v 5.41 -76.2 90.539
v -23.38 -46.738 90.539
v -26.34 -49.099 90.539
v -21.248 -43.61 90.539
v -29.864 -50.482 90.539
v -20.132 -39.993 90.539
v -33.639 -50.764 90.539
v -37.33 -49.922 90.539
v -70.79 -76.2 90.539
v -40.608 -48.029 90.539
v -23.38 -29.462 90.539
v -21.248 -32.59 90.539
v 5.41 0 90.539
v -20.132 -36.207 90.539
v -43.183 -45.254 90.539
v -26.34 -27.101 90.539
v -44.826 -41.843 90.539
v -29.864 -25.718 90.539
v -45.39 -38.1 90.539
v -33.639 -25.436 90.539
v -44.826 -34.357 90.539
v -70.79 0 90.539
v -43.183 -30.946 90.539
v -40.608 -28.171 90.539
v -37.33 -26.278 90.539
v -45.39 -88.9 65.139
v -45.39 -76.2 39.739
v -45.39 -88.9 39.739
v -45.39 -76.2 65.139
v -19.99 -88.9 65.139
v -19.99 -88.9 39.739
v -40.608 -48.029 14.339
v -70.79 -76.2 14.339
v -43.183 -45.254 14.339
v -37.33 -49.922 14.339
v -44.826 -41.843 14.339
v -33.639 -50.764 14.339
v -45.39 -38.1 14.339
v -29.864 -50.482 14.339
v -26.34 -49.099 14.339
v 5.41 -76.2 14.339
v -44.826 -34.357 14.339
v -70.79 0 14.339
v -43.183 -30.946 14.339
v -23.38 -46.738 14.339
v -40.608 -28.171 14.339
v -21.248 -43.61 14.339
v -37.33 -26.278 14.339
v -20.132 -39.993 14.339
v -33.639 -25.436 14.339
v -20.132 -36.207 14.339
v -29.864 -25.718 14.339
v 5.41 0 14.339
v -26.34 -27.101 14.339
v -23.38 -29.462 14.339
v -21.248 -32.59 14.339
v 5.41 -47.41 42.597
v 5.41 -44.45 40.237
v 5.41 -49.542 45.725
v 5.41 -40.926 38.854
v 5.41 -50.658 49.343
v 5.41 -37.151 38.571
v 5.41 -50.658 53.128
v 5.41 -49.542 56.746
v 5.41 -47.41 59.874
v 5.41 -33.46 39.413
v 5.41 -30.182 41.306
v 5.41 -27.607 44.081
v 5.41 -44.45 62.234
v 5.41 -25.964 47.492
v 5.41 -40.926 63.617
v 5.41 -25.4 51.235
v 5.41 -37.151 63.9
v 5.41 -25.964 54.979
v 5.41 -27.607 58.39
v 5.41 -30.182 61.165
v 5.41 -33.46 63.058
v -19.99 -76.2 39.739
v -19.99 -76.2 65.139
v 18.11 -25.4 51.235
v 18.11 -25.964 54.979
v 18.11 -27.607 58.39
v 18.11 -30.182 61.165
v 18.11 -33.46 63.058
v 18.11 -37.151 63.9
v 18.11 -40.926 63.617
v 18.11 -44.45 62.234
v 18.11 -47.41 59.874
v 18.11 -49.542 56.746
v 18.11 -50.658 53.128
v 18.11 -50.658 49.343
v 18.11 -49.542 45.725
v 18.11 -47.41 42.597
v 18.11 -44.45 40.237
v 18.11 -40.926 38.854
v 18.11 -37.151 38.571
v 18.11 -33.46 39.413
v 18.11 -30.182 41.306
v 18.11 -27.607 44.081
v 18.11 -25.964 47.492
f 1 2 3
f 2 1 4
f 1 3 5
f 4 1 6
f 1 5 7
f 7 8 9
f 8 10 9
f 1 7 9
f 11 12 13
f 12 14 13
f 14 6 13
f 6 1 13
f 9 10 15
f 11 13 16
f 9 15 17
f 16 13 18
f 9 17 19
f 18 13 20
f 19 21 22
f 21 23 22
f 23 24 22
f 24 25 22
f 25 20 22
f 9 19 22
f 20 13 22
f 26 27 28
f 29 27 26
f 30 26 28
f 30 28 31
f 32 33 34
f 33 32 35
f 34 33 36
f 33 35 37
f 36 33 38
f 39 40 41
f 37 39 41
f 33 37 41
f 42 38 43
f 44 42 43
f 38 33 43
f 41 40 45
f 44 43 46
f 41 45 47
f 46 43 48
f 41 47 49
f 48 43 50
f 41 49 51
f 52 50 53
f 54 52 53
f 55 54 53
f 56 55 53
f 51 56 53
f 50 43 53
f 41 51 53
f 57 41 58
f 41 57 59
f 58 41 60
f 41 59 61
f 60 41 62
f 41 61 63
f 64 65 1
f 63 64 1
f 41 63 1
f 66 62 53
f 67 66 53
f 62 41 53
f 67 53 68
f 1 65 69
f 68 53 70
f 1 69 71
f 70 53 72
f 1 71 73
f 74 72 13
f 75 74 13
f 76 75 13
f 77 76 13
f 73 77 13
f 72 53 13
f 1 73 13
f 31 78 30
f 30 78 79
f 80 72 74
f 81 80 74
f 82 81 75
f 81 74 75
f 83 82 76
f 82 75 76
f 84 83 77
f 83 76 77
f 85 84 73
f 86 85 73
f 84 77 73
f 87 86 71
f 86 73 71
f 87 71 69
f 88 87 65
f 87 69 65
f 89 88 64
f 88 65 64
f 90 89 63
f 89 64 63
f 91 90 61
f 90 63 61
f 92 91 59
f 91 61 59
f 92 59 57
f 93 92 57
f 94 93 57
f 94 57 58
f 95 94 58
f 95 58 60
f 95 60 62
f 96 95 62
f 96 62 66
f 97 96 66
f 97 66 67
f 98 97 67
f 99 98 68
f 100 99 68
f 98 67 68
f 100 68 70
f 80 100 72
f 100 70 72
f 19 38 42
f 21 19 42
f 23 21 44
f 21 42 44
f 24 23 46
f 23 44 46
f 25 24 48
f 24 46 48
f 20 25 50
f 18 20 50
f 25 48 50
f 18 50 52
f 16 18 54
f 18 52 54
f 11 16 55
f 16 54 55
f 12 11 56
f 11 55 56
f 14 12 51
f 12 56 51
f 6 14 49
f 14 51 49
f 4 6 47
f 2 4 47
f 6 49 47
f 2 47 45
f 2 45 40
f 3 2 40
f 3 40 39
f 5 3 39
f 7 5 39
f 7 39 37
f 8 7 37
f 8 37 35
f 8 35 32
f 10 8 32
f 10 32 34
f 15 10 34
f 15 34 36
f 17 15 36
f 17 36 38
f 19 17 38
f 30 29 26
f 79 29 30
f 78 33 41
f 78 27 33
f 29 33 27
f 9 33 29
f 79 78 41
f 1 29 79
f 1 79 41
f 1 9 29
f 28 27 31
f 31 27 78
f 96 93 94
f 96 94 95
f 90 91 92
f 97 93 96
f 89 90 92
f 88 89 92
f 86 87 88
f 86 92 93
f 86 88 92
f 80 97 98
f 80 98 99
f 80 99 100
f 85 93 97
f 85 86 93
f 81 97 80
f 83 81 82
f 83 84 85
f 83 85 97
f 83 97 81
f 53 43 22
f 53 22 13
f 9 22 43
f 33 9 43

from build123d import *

# Parameters (mm, degrees)
F1_DEPTH = 76.2
F2_W     = 25.4
F2_H     = 25.4
F3_DEPTH = 12.7
F4_R     = 12.7
F5_DEPTH = 12.7
F7_D     = 25.4


with BuildPart() as f1:
    # F0 (on Front) → F1 (new body)
    with BuildSketch(Plane.XZ):
        Polygon((-70.789909, 90.538534), (-70.789909, 14.338534), (5.410091, 14.338534), (5.410091, 90.538534), (-11.810248, 90.538534), (-32.689909, 90.538534), align=None)
    extrude(amount=F1_DEPTH)

    # F2 (on face) → F3 (join)
    with BuildSketch(Plane.XZ.offset(76.2)):
        with Locations((-32.689909, 52.438534)):
            Rectangle(F2_W, F2_H)
    extrude(amount=F3_DEPTH)

    # F4 (on face) → F5 (join)
    with BuildSketch(Plane.YZ.offset(5.410091)):
        with Locations((-38.1, 51.235449)):
            Circle(F4_R)
    extrude(amount=F5_DEPTH)

    # F7 (through all)
    with Locations(Plane.XY.offset(90.538534)):
        with Locations((-32.689909, -38.1)):
            Hole(F7_D / 2)


solid = f1.part
